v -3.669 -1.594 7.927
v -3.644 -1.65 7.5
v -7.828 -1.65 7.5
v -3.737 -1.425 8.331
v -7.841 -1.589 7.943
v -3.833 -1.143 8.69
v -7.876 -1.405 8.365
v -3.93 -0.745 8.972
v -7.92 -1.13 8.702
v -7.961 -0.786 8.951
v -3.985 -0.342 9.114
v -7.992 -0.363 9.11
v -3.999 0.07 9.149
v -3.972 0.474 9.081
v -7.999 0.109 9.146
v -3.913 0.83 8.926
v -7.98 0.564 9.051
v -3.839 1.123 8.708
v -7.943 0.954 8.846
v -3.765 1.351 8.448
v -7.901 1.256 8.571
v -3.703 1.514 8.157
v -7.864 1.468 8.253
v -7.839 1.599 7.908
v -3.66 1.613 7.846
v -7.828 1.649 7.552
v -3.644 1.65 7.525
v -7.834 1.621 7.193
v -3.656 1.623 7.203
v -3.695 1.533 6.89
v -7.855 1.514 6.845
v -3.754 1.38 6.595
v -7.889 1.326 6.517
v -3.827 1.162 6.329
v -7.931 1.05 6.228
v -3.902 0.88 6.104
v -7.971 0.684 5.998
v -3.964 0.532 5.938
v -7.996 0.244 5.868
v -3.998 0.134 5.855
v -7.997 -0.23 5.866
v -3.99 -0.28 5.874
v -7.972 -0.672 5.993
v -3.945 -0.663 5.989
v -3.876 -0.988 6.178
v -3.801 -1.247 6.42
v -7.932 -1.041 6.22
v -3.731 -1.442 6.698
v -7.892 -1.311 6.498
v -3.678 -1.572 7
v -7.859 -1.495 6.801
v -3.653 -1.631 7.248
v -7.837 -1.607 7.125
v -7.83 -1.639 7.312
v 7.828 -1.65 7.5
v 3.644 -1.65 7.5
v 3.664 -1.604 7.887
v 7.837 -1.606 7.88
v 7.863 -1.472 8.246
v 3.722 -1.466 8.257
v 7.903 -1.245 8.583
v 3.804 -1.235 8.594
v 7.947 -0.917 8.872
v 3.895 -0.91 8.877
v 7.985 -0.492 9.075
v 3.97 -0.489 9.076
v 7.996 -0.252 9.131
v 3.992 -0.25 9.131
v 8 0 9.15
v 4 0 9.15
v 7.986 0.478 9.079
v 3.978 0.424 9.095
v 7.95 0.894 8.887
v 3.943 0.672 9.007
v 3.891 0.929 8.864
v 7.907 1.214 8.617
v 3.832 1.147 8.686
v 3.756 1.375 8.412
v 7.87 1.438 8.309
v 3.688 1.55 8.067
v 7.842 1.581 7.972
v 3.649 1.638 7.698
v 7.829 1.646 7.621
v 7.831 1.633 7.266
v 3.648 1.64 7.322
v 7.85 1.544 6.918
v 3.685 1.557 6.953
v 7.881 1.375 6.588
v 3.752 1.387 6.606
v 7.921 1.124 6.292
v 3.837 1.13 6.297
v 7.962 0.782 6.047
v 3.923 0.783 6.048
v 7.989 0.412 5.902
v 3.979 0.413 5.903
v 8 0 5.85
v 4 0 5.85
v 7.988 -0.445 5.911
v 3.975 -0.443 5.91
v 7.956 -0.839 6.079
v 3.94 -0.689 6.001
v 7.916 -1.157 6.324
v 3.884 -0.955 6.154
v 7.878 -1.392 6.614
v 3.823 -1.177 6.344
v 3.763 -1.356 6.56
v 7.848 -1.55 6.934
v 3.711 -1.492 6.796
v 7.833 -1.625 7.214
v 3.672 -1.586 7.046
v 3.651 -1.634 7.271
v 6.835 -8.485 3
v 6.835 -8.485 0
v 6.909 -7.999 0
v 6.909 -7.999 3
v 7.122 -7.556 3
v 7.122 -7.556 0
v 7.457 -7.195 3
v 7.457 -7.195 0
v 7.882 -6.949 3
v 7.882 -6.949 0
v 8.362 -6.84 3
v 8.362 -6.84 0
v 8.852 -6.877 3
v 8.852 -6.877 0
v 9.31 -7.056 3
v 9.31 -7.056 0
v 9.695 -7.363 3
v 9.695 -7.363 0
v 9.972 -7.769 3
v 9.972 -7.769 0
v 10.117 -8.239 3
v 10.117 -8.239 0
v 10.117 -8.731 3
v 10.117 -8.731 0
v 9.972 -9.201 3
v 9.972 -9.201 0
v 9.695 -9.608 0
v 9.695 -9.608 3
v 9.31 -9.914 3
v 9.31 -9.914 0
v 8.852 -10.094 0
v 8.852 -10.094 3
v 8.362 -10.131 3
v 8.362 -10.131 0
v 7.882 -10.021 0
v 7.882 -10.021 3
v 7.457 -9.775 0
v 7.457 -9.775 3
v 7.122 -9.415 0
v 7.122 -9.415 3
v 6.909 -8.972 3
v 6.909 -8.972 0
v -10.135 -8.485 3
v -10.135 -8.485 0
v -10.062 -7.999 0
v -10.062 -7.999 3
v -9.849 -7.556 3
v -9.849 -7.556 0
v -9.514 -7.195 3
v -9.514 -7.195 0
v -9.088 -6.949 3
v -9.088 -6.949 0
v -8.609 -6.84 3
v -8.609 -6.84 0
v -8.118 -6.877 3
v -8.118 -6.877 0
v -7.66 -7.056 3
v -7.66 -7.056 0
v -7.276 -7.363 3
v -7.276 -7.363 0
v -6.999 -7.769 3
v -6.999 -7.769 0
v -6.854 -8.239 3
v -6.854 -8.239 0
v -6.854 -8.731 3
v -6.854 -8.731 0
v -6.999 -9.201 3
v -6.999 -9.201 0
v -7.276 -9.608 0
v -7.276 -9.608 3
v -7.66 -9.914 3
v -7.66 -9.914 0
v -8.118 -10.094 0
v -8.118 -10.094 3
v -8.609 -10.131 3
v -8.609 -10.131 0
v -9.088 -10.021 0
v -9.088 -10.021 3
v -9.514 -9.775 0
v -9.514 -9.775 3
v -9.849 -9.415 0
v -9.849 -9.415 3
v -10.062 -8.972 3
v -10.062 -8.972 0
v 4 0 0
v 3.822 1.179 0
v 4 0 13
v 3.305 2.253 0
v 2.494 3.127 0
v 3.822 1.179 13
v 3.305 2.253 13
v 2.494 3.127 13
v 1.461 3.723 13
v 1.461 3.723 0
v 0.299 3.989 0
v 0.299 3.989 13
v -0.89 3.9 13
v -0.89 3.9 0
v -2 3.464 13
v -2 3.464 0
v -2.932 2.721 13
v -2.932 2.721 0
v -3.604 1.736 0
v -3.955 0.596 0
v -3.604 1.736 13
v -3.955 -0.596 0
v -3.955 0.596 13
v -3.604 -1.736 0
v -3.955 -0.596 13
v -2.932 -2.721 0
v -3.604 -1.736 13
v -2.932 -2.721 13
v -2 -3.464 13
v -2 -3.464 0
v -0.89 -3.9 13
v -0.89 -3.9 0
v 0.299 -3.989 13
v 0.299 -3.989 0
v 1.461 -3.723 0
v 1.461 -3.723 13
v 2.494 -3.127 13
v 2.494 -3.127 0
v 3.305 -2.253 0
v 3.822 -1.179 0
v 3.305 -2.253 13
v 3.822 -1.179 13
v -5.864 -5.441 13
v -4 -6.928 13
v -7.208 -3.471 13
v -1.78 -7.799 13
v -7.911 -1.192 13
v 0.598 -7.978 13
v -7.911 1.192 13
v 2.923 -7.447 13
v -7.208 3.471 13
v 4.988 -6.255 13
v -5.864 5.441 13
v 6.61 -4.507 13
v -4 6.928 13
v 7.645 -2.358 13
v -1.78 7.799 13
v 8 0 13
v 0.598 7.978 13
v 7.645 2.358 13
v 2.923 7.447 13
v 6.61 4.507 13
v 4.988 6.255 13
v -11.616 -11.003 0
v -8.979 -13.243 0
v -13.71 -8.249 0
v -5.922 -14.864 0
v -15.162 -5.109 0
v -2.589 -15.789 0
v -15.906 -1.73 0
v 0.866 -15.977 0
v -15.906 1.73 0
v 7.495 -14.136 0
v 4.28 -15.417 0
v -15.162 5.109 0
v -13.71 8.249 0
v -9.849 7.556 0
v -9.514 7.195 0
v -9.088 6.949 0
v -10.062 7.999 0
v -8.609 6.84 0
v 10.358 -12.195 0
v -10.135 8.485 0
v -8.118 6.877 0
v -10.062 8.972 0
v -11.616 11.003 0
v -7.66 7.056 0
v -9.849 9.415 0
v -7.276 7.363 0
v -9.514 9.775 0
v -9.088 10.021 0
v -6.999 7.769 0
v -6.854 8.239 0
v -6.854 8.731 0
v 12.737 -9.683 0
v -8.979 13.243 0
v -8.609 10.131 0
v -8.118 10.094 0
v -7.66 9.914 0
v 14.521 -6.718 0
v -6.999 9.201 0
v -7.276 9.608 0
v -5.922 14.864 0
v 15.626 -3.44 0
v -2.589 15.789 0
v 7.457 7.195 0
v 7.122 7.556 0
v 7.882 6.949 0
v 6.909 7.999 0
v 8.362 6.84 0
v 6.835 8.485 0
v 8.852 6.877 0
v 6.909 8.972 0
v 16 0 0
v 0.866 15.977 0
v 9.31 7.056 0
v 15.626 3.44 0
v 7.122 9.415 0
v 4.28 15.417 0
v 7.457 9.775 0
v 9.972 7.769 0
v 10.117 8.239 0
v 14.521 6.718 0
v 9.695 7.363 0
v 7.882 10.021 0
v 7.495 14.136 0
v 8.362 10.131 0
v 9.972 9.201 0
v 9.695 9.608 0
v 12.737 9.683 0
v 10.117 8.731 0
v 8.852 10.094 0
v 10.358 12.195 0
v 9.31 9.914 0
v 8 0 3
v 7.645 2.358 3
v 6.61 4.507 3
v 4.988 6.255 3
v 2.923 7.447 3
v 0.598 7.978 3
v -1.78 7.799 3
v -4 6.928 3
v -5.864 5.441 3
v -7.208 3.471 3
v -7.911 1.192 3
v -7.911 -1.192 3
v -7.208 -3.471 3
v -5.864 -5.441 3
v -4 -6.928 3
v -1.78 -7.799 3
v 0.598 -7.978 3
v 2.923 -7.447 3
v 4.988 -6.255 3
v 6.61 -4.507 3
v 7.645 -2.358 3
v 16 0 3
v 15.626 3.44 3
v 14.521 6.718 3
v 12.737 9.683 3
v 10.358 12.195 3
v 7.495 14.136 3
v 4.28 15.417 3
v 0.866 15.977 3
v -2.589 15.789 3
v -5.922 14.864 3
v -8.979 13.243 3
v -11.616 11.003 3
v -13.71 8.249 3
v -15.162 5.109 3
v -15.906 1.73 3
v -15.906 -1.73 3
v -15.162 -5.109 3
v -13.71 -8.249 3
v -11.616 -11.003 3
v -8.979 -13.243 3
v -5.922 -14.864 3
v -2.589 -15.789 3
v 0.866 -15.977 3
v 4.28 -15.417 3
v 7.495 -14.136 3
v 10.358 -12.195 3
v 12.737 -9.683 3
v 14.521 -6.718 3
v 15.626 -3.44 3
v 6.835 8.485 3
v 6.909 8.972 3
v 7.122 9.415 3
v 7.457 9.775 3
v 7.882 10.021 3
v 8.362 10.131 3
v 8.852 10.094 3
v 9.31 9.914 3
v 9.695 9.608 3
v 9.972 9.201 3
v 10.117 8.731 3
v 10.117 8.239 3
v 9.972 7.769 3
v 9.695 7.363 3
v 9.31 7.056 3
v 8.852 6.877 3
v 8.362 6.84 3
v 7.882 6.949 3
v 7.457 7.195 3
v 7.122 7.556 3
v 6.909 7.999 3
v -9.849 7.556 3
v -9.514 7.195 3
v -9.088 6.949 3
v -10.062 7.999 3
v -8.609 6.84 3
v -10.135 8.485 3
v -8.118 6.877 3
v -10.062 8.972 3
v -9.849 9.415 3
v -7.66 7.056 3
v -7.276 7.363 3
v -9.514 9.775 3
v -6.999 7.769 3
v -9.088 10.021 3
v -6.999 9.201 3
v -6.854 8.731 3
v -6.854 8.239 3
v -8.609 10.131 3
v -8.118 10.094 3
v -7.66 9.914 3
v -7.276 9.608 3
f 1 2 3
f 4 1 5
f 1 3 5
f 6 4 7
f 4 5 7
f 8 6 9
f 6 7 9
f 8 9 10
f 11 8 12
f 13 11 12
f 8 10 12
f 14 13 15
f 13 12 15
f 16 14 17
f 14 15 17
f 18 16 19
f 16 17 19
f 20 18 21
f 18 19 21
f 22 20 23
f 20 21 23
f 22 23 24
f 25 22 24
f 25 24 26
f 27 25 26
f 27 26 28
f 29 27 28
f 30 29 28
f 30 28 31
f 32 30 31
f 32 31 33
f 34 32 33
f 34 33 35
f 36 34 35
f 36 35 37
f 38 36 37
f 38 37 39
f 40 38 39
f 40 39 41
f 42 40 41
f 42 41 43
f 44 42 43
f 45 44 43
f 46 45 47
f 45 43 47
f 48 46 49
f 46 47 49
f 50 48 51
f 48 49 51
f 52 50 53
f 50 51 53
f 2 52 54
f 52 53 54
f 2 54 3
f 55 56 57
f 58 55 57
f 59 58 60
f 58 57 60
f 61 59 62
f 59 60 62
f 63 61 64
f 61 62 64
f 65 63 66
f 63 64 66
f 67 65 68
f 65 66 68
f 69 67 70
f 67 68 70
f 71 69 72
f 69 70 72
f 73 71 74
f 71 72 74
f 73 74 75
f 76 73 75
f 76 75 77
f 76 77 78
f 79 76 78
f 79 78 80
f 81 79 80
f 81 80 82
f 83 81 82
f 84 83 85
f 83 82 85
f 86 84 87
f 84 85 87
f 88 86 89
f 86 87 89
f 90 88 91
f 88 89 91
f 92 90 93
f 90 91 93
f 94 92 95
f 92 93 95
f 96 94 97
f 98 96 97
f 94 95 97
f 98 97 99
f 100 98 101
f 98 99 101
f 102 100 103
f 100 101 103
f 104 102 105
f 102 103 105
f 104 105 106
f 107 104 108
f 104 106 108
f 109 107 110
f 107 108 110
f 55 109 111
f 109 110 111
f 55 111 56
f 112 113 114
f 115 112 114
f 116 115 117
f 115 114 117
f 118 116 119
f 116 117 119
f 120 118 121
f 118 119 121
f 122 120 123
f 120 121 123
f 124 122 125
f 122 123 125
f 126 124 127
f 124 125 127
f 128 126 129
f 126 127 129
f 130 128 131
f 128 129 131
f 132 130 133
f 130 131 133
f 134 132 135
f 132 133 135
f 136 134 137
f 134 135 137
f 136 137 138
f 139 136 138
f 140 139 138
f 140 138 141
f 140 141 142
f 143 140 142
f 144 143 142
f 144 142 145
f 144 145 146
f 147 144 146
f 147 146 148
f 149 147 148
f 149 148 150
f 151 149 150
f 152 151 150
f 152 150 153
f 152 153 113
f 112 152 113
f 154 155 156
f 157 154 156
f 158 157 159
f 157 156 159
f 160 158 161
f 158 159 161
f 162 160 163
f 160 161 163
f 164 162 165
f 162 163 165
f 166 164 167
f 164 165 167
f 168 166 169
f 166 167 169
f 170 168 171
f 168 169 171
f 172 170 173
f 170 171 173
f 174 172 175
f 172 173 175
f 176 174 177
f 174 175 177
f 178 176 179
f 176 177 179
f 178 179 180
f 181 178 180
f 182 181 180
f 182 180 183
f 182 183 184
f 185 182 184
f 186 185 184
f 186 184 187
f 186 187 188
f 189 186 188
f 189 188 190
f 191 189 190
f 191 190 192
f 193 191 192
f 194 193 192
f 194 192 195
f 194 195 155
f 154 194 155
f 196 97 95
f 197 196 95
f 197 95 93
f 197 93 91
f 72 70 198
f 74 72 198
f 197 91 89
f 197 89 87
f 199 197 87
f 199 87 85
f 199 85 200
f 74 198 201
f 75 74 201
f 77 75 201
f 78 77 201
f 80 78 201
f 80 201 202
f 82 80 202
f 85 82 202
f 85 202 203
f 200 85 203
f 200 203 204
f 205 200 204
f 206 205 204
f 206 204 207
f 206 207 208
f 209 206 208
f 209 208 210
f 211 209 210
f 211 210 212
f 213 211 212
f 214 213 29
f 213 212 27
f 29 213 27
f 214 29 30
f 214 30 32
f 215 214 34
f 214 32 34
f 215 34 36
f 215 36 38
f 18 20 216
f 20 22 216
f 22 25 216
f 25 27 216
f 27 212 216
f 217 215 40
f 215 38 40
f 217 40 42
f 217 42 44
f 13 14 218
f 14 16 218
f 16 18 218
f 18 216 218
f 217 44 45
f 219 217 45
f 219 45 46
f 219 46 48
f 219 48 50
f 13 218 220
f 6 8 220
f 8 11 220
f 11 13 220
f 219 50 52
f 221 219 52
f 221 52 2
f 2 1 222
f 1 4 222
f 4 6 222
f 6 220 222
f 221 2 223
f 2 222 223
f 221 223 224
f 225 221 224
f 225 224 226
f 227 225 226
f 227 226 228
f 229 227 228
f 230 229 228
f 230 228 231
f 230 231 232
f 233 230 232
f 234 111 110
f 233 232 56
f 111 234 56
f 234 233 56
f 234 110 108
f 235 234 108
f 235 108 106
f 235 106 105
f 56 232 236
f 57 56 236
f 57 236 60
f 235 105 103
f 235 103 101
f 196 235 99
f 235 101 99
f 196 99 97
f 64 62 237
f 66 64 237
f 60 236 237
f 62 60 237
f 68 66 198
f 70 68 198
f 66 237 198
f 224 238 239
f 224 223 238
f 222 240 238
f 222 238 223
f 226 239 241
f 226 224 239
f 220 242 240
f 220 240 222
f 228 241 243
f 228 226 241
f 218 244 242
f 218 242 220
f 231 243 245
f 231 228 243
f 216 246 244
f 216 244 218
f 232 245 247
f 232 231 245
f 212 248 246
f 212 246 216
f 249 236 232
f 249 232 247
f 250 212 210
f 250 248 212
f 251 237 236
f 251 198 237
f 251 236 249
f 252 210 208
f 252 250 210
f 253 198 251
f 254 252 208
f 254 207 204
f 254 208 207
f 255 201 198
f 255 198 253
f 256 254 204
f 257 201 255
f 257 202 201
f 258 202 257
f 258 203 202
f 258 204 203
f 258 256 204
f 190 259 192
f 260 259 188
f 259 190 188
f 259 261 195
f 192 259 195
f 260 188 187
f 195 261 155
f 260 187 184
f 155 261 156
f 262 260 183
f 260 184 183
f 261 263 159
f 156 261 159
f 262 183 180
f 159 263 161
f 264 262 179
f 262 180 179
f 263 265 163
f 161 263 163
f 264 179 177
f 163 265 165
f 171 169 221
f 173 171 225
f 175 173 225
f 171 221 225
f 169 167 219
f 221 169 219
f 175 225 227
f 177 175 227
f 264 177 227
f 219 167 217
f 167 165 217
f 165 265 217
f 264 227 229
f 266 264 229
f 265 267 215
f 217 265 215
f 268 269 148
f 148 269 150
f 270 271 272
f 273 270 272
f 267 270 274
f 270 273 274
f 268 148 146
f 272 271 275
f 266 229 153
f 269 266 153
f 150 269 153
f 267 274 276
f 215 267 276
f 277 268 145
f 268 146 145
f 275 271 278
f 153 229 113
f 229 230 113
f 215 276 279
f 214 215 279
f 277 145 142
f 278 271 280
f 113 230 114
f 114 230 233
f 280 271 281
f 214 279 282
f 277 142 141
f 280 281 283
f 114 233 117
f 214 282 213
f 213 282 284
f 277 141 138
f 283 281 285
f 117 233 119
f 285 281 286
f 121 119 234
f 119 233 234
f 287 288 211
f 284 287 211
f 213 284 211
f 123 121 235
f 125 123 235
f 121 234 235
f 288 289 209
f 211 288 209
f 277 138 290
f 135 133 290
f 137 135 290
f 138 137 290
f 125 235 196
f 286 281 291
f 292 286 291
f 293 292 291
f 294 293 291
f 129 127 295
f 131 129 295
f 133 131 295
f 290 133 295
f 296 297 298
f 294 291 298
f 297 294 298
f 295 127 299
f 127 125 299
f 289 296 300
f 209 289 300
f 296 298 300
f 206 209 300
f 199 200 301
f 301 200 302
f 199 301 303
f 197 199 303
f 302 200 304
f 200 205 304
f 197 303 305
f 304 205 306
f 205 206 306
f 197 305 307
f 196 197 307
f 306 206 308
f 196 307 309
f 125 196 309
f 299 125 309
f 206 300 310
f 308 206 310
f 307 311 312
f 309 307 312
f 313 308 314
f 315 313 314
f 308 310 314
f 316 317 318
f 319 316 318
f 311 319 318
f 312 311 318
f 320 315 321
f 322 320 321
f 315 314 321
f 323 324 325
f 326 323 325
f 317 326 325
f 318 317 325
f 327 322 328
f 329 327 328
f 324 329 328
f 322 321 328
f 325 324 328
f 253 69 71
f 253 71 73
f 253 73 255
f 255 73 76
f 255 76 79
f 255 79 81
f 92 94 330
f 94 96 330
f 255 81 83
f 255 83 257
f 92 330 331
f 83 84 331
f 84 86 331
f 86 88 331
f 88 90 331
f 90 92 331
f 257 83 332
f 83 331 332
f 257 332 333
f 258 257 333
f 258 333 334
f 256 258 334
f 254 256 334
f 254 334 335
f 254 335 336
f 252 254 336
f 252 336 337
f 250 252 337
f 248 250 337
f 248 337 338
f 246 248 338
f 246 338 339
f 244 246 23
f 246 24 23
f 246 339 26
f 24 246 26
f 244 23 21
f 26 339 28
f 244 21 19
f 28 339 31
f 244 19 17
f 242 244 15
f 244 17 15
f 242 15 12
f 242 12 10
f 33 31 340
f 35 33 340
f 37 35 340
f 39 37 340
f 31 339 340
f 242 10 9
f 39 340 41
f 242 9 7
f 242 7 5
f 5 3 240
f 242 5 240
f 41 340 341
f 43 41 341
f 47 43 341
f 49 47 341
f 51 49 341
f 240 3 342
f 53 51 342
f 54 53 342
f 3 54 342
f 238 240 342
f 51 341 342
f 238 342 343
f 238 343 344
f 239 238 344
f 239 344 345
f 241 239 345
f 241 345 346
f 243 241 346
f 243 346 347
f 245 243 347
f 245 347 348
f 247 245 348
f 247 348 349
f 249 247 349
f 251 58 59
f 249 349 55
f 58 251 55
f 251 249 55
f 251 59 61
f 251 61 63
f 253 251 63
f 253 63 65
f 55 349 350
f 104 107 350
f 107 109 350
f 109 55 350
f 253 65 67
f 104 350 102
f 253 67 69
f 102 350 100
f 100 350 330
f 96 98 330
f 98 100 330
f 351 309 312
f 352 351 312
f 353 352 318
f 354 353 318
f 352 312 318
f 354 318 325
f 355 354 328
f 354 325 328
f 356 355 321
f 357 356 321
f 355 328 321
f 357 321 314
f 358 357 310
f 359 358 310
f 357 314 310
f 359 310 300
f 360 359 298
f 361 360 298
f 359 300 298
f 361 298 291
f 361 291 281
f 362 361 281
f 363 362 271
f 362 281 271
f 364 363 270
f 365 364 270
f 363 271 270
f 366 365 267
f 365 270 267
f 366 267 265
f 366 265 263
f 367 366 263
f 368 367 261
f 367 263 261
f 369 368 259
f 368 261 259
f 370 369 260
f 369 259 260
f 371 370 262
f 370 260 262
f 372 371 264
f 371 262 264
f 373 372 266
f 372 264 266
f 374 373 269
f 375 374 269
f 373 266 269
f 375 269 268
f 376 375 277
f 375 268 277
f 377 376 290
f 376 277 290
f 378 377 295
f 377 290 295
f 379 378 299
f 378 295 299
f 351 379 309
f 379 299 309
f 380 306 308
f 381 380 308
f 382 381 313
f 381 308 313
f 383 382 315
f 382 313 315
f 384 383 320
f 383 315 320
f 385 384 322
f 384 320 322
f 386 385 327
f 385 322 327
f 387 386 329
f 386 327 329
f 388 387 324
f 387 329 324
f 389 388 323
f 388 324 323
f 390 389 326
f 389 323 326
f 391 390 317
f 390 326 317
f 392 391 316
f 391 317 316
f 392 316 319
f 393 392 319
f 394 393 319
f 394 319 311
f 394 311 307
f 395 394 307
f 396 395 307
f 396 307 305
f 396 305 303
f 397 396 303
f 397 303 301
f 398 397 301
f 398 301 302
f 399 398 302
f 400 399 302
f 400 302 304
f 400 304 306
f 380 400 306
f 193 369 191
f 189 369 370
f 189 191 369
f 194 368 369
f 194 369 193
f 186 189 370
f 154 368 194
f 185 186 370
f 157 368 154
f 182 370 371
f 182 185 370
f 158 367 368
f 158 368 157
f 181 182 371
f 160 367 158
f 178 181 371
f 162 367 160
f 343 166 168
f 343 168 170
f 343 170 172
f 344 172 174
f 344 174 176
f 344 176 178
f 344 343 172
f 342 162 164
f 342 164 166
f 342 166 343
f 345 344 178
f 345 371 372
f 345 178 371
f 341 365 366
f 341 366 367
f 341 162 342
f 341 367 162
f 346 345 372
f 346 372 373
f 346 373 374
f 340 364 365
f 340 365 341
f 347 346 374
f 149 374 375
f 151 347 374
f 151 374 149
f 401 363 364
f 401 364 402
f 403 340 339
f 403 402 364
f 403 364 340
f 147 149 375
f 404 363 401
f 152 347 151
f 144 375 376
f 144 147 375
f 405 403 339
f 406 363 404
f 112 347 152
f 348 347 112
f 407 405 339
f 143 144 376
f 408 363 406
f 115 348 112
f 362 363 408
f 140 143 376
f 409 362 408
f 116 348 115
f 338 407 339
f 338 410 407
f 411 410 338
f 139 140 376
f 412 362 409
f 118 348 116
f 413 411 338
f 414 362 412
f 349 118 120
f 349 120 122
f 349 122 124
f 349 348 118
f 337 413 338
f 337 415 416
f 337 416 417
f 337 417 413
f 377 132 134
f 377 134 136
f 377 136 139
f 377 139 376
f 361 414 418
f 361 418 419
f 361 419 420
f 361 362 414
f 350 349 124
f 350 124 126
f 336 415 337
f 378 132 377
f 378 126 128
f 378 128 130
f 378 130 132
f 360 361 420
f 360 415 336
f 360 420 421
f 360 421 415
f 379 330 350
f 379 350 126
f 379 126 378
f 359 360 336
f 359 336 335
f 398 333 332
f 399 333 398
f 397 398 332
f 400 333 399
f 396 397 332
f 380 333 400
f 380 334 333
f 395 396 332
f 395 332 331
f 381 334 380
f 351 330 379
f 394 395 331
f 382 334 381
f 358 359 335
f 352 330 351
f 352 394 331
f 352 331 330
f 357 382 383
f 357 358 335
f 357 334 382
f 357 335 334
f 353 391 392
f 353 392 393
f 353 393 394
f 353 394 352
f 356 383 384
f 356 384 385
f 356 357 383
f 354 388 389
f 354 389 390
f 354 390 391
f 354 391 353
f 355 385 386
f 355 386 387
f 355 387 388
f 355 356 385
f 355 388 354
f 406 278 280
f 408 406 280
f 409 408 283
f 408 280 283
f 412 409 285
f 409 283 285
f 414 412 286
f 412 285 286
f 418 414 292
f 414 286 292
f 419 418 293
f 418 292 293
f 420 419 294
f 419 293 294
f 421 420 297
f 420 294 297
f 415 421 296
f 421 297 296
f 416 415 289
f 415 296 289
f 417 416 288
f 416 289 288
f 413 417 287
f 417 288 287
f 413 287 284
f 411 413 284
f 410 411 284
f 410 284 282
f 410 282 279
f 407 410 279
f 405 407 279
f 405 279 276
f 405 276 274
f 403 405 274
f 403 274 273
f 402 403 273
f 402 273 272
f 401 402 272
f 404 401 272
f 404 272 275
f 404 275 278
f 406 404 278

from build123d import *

# Parameters (mm, degrees)
SKETCH_1_R             = 16
EXTRUDE_1_DEPTH        = 3
SKETCH_2_R             = 8
EXTRUDE_2_DEPTH        = 10
SKETCH_3_R             = 4
CUT_EXTRUDE_1_DEPTH    = 14
SKETCH_5_R             = 1.5
CUT_EXTRUDE_3_DEPTH    = 4
HOLE_WIZARD_M4_1_D     = 3.3
HOLE_WIZARD_M4_1_DEPTH = 3
HOLE_WIZARD_M4_2_D     = 3.3


with BuildPart() as part:
    # 草图1 → 凸台-拉伸1 (new body)
    with BuildSketch(Plane.XY):
        Circle(SKETCH_1_R)
    extrude(amount=EXTRUDE_1_DEPTH)

    # 草图2 → 凸台-拉伸2 (add)
    with BuildSketch(Plane.XY.offset(3)):
        Circle(SKETCH_2_R)
    extrude(amount=EXTRUDE_2_DEPTH)

    # 草图3 → 切除-拉伸1 (cut, through all)
    with BuildSketch(Plane.XY.offset(13)):
        Circle(SKETCH_3_R)
    extrude(amount=-CUT_EXTRUDE_1_DEPTH, mode=Mode.SUBTRACT)

    # 草图5 → 切除-拉伸3 (cut, through all)
    with BuildSketch(Plane.XY.offset(3)):
        with Locations((-8.485281374, -8.485281374)):
            Circle(SKETCH_5_R)
        with Locations((-8.485281374, 8.485281374)):
            Circle(SKETCH_5_R)
        with Locations((8.485281374, -8.485281374)):
            Circle(SKETCH_5_R)
        with Locations((8.485281374, 8.485281374)):
            Circle(SKETCH_5_R)
    extrude(amount=-CUT_EXTRUDE_3_DEPTH, mode=Mode.SUBTRACT)

    # M4 螺纹孔1
    with Locations(Plane(origin=(-8.485281374, 8.485281374, 3), x_dir=(1, 0, 0), z_dir=(0, 0, 1))):
        with Locations((0, 0), (16.970562748, 0), (16.970562748, -16.970562748), (0, -16.970562748)):
            Hole(HOLE_WIZARD_M4_1_D / 2, depth=HOLE_WIZARD_M4_1_DEPTH)

    # M4 螺纹孔2 (through all)
    with Locations(Plane(origin=(8, 0, 7.5), x_dir=(0, 1, 0), z_dir=(1, 0, 0))):
        with Locations((0, 0)):
            Hole(HOLE_WIZARD_M4_2_D / 2)


solid = part.part
